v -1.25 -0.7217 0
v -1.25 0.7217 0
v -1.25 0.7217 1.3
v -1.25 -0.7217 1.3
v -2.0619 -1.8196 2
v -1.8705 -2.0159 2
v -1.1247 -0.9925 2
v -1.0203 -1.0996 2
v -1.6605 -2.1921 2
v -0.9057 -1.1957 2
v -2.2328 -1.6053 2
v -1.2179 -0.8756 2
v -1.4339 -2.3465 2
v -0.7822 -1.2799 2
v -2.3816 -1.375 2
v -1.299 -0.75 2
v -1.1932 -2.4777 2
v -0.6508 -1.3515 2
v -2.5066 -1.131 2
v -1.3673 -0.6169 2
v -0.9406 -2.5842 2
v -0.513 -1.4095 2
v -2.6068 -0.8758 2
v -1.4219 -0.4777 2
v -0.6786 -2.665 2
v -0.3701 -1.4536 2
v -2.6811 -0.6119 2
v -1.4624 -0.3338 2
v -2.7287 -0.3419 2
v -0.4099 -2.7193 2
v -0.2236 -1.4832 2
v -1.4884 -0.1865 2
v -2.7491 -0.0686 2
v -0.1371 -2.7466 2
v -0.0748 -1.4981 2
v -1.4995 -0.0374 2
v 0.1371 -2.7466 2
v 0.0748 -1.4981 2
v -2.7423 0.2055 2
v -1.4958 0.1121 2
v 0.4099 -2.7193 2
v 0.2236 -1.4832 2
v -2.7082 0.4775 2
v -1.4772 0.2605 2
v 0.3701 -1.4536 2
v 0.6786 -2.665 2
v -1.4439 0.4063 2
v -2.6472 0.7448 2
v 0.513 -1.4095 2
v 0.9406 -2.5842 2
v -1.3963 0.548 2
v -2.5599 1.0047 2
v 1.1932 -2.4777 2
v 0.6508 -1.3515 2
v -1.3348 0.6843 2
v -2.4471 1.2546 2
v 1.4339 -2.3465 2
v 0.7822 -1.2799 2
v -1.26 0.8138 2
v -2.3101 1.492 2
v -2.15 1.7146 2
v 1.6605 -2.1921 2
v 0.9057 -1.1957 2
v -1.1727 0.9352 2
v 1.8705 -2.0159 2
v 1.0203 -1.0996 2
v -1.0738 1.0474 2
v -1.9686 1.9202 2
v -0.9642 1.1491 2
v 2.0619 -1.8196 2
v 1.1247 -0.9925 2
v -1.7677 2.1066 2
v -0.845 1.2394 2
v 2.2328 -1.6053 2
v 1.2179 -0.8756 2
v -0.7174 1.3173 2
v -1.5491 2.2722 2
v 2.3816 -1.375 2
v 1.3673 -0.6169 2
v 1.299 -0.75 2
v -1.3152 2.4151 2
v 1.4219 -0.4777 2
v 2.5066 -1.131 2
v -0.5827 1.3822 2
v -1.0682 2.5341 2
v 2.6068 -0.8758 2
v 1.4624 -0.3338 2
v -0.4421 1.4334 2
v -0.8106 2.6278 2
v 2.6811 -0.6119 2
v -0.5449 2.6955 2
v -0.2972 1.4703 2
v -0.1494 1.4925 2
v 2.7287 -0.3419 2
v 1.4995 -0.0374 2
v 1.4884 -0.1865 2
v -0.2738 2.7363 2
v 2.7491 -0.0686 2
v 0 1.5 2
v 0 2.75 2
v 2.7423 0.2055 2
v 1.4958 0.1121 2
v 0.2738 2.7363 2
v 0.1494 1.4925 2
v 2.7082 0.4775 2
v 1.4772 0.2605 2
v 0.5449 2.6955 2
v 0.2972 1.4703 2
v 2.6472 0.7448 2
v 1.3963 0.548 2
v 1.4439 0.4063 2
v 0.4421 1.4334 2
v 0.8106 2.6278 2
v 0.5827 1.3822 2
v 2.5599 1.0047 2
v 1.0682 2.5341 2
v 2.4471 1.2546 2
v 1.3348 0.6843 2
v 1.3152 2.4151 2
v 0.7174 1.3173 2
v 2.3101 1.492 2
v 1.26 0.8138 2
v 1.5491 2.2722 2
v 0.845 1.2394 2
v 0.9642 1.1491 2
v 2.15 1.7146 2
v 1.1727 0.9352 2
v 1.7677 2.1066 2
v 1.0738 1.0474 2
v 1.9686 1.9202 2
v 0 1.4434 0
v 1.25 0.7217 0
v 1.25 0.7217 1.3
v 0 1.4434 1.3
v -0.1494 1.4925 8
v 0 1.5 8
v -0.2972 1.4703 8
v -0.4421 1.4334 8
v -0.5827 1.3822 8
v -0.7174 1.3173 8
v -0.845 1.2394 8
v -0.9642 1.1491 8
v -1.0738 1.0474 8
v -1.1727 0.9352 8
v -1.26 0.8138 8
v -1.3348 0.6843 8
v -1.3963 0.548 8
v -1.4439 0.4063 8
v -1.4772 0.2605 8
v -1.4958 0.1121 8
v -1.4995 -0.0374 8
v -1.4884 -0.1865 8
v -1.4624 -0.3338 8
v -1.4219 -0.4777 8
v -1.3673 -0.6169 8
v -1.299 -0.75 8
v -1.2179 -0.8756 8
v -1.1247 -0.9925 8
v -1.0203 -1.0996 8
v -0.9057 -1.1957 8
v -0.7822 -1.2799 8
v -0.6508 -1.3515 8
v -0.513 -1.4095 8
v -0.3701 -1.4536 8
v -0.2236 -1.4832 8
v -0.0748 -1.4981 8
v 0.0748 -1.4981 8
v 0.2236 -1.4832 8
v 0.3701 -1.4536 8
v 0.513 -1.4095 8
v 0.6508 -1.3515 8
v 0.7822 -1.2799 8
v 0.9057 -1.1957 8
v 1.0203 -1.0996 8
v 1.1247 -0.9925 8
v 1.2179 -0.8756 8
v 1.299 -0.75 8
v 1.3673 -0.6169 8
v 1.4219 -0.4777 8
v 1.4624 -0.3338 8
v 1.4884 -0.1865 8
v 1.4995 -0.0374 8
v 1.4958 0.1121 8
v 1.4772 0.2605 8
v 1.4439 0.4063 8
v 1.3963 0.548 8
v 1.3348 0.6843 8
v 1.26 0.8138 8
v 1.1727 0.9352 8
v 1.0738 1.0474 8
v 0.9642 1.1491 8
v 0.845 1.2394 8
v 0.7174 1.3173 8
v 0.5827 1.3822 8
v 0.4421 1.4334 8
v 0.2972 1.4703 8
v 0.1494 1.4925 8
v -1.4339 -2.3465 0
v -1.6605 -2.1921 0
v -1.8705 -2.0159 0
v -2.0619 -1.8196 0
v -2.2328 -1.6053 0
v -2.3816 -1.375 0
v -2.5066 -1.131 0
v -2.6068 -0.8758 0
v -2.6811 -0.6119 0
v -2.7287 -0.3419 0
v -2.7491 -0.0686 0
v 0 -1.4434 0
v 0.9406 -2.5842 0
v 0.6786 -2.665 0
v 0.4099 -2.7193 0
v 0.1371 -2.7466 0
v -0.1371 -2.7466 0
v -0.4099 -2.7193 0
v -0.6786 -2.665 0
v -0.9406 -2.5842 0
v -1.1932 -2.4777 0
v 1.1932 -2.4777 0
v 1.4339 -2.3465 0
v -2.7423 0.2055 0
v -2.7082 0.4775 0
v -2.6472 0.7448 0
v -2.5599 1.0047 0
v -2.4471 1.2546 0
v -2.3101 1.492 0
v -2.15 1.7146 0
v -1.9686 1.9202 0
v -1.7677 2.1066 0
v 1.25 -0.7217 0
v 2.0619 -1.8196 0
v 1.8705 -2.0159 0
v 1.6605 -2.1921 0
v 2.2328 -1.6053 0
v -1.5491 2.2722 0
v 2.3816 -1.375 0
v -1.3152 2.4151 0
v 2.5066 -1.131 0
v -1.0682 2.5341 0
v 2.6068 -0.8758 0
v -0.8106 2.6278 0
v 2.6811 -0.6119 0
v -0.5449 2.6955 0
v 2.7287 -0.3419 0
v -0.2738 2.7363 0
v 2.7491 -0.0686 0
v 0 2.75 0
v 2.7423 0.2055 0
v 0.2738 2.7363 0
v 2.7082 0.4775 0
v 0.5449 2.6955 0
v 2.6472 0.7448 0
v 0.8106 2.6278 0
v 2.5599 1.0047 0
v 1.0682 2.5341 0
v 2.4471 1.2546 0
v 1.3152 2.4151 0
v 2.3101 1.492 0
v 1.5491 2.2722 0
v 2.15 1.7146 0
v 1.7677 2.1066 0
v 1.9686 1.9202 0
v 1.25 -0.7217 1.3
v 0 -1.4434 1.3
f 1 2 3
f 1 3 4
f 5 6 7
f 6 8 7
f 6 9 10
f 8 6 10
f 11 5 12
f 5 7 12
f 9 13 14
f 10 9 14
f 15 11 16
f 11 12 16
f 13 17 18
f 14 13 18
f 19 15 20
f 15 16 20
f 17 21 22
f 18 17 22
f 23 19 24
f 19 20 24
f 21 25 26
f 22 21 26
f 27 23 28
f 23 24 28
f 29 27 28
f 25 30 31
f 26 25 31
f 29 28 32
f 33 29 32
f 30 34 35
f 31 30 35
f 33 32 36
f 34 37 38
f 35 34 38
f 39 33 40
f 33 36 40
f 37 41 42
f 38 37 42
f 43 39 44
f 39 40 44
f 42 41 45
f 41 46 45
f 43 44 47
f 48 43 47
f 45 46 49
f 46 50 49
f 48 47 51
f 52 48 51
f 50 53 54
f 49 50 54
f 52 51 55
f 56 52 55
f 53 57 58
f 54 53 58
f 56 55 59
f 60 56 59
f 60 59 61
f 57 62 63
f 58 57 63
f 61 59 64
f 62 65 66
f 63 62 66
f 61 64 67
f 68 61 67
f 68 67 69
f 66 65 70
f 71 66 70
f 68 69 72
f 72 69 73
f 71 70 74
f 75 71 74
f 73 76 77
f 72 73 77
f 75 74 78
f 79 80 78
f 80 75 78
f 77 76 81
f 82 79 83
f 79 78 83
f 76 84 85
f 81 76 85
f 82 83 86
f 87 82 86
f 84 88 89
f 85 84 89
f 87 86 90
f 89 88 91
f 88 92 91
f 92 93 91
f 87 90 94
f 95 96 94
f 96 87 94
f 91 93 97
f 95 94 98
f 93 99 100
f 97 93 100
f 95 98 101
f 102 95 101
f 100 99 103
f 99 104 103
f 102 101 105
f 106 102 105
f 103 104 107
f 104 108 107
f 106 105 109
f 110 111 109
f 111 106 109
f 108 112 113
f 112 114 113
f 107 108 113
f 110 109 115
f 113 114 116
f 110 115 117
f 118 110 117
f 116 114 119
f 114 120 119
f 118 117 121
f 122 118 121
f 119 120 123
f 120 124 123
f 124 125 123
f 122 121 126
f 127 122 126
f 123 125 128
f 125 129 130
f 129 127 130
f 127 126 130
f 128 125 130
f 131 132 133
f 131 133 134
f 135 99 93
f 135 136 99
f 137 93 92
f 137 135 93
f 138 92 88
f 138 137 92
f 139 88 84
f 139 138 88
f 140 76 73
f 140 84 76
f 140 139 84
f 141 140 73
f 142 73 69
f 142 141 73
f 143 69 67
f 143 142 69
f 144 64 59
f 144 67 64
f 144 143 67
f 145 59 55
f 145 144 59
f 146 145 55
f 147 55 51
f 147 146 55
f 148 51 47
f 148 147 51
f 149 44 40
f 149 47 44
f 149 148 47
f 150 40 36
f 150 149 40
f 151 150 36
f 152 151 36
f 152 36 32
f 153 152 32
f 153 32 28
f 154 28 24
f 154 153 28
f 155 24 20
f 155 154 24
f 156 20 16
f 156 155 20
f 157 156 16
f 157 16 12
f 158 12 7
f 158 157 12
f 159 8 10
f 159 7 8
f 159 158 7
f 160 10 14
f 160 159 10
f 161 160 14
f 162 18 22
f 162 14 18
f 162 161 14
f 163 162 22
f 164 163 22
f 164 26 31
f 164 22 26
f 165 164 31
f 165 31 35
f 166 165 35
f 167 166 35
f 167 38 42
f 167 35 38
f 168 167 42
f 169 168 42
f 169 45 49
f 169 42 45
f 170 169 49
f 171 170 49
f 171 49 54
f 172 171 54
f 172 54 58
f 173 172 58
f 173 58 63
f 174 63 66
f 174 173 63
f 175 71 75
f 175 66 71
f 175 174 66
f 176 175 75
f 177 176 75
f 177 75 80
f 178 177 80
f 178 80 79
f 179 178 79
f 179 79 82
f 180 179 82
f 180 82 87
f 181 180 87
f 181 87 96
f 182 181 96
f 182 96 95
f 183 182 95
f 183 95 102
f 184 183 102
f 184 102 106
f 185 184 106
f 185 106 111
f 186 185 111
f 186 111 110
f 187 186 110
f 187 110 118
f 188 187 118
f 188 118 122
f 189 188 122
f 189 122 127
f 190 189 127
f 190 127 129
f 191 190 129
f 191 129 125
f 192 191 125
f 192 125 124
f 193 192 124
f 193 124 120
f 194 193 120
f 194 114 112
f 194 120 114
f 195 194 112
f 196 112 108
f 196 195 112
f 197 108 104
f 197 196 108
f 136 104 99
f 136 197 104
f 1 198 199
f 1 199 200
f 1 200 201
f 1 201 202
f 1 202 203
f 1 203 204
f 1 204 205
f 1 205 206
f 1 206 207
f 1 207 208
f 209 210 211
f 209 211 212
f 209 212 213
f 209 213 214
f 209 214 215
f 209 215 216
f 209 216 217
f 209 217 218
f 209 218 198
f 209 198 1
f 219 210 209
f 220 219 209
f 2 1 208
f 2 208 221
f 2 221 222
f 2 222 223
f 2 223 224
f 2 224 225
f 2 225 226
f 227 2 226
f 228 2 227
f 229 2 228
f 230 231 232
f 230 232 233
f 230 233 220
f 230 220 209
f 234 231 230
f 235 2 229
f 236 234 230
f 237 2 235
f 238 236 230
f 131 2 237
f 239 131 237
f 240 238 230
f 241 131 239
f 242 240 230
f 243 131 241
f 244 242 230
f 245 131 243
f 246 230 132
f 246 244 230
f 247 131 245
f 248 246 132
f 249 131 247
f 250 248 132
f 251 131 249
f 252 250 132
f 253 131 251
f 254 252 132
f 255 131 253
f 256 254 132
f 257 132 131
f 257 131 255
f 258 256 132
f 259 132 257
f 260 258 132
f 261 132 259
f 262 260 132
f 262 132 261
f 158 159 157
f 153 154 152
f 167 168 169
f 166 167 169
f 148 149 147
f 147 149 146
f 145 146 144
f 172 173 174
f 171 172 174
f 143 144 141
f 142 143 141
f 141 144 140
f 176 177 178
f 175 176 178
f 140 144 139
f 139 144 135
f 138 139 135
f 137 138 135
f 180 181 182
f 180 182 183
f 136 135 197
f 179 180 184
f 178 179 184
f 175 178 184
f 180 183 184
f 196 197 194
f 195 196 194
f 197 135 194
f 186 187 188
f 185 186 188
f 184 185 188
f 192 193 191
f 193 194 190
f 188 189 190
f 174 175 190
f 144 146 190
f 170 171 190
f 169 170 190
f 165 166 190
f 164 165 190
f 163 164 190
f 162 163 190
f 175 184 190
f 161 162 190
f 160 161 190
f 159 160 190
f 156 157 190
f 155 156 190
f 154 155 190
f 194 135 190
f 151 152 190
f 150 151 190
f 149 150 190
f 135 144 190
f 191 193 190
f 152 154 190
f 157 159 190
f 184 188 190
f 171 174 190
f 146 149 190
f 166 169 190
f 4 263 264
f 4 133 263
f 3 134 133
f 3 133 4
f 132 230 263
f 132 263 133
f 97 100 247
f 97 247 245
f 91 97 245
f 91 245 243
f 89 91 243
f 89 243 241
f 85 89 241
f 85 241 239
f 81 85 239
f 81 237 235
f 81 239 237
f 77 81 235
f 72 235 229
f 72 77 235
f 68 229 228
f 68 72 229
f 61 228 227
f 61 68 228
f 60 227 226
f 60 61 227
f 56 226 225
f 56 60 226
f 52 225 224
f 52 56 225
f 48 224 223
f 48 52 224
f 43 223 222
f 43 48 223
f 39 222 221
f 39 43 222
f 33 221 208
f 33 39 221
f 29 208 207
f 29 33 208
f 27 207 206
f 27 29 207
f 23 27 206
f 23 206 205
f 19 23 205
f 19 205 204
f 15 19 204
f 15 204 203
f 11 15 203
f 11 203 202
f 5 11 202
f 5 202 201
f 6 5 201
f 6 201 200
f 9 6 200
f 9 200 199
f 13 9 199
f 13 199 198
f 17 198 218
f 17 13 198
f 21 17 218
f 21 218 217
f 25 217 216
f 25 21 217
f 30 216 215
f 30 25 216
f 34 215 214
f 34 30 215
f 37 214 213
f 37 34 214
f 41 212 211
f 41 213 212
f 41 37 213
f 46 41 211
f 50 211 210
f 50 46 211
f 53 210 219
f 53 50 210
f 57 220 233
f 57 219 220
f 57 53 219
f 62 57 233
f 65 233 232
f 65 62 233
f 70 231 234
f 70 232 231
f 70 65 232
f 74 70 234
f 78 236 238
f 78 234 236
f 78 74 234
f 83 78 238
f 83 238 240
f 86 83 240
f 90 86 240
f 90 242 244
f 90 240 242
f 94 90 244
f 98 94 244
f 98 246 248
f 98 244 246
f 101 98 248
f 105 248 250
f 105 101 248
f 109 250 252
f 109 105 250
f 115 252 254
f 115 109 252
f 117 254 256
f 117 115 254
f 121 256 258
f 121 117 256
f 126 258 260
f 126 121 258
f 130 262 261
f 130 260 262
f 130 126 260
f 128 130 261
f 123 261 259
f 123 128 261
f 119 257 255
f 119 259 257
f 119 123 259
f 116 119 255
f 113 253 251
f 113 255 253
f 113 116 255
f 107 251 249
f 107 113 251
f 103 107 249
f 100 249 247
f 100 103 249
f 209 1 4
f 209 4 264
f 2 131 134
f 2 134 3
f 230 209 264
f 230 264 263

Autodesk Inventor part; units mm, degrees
ref_plane "YZ Plane" through (0, 0, 0) normal (1, 0, 0) x (0, 1, 0)
ref_plane "XZ Plane" through (0, 0, 0) normal (0, 1, 0) x (-1, 0, 0)
ref_plane "XY Plane" through (0, 0, 0) normal (0, 0, 1) x (1, 0, 0)
sketch "スケッチ1" plane through (0, 0, 0) normal (1, 0, 0) x (0, 1, 0)
  line L0 (0, 8) -> (0, 0)
  line L1 (0, 0) -> (2.75, 0)
  line L2 (2.75, 0) -> (2.75, 2)
  line L3 (2.75, 2) -> (1.5, 2)
  line L4 (1.5, 2) -> (1.5, 8)
  line L5 (1.5, 8) -> (0, 8)
  dimension "d2" = 2
  dimension "d10" = 6
  dimension "d11" = 3
  dimension "d12" = 5.5
revolve "回転1" add sketch "スケッチ1" angle 360 about axis through (0, 0, 8) along (0, 0, -1)
thread "ねじ1" size "M3x0.5" class "6g" standard "ANSI Metric M Profile" full length
sketch "スケッチ2" plane through (0, 0, 0) normal (0, 0, -1) x (-1, 0, 0)
  line L0 (0, 1.4434) -> (1.25, 0.7217)
  line L1 (1.25, 0.7217) -> (1.25, -0.7217)
  line L2 (1.25, -0.7217) -> (0, -1.4434)
  line L3 (0, -1.4434) -> (-1.25, -0.7217)
  line L4 (-1.25, -0.7217) -> (-1.25, 0.7217)
  line L5 (-1.25, 0.7217) -> (0, 1.4434)
  circle A0 centre (0, 0) radius 2.75 projected
  line L6 (0, 2.75) -> (0, -2.75) construction
  point P0 (0, 0)
  dimension "d7" = 2.5
extrude "押し出し1" cut sketch "スケッチ2" against normal blind 1.3 contours L0 L1 L2 L3 L4 L5
properties part number "LowHead_M3-6" material "ステンレス鋼 AISI 304"
